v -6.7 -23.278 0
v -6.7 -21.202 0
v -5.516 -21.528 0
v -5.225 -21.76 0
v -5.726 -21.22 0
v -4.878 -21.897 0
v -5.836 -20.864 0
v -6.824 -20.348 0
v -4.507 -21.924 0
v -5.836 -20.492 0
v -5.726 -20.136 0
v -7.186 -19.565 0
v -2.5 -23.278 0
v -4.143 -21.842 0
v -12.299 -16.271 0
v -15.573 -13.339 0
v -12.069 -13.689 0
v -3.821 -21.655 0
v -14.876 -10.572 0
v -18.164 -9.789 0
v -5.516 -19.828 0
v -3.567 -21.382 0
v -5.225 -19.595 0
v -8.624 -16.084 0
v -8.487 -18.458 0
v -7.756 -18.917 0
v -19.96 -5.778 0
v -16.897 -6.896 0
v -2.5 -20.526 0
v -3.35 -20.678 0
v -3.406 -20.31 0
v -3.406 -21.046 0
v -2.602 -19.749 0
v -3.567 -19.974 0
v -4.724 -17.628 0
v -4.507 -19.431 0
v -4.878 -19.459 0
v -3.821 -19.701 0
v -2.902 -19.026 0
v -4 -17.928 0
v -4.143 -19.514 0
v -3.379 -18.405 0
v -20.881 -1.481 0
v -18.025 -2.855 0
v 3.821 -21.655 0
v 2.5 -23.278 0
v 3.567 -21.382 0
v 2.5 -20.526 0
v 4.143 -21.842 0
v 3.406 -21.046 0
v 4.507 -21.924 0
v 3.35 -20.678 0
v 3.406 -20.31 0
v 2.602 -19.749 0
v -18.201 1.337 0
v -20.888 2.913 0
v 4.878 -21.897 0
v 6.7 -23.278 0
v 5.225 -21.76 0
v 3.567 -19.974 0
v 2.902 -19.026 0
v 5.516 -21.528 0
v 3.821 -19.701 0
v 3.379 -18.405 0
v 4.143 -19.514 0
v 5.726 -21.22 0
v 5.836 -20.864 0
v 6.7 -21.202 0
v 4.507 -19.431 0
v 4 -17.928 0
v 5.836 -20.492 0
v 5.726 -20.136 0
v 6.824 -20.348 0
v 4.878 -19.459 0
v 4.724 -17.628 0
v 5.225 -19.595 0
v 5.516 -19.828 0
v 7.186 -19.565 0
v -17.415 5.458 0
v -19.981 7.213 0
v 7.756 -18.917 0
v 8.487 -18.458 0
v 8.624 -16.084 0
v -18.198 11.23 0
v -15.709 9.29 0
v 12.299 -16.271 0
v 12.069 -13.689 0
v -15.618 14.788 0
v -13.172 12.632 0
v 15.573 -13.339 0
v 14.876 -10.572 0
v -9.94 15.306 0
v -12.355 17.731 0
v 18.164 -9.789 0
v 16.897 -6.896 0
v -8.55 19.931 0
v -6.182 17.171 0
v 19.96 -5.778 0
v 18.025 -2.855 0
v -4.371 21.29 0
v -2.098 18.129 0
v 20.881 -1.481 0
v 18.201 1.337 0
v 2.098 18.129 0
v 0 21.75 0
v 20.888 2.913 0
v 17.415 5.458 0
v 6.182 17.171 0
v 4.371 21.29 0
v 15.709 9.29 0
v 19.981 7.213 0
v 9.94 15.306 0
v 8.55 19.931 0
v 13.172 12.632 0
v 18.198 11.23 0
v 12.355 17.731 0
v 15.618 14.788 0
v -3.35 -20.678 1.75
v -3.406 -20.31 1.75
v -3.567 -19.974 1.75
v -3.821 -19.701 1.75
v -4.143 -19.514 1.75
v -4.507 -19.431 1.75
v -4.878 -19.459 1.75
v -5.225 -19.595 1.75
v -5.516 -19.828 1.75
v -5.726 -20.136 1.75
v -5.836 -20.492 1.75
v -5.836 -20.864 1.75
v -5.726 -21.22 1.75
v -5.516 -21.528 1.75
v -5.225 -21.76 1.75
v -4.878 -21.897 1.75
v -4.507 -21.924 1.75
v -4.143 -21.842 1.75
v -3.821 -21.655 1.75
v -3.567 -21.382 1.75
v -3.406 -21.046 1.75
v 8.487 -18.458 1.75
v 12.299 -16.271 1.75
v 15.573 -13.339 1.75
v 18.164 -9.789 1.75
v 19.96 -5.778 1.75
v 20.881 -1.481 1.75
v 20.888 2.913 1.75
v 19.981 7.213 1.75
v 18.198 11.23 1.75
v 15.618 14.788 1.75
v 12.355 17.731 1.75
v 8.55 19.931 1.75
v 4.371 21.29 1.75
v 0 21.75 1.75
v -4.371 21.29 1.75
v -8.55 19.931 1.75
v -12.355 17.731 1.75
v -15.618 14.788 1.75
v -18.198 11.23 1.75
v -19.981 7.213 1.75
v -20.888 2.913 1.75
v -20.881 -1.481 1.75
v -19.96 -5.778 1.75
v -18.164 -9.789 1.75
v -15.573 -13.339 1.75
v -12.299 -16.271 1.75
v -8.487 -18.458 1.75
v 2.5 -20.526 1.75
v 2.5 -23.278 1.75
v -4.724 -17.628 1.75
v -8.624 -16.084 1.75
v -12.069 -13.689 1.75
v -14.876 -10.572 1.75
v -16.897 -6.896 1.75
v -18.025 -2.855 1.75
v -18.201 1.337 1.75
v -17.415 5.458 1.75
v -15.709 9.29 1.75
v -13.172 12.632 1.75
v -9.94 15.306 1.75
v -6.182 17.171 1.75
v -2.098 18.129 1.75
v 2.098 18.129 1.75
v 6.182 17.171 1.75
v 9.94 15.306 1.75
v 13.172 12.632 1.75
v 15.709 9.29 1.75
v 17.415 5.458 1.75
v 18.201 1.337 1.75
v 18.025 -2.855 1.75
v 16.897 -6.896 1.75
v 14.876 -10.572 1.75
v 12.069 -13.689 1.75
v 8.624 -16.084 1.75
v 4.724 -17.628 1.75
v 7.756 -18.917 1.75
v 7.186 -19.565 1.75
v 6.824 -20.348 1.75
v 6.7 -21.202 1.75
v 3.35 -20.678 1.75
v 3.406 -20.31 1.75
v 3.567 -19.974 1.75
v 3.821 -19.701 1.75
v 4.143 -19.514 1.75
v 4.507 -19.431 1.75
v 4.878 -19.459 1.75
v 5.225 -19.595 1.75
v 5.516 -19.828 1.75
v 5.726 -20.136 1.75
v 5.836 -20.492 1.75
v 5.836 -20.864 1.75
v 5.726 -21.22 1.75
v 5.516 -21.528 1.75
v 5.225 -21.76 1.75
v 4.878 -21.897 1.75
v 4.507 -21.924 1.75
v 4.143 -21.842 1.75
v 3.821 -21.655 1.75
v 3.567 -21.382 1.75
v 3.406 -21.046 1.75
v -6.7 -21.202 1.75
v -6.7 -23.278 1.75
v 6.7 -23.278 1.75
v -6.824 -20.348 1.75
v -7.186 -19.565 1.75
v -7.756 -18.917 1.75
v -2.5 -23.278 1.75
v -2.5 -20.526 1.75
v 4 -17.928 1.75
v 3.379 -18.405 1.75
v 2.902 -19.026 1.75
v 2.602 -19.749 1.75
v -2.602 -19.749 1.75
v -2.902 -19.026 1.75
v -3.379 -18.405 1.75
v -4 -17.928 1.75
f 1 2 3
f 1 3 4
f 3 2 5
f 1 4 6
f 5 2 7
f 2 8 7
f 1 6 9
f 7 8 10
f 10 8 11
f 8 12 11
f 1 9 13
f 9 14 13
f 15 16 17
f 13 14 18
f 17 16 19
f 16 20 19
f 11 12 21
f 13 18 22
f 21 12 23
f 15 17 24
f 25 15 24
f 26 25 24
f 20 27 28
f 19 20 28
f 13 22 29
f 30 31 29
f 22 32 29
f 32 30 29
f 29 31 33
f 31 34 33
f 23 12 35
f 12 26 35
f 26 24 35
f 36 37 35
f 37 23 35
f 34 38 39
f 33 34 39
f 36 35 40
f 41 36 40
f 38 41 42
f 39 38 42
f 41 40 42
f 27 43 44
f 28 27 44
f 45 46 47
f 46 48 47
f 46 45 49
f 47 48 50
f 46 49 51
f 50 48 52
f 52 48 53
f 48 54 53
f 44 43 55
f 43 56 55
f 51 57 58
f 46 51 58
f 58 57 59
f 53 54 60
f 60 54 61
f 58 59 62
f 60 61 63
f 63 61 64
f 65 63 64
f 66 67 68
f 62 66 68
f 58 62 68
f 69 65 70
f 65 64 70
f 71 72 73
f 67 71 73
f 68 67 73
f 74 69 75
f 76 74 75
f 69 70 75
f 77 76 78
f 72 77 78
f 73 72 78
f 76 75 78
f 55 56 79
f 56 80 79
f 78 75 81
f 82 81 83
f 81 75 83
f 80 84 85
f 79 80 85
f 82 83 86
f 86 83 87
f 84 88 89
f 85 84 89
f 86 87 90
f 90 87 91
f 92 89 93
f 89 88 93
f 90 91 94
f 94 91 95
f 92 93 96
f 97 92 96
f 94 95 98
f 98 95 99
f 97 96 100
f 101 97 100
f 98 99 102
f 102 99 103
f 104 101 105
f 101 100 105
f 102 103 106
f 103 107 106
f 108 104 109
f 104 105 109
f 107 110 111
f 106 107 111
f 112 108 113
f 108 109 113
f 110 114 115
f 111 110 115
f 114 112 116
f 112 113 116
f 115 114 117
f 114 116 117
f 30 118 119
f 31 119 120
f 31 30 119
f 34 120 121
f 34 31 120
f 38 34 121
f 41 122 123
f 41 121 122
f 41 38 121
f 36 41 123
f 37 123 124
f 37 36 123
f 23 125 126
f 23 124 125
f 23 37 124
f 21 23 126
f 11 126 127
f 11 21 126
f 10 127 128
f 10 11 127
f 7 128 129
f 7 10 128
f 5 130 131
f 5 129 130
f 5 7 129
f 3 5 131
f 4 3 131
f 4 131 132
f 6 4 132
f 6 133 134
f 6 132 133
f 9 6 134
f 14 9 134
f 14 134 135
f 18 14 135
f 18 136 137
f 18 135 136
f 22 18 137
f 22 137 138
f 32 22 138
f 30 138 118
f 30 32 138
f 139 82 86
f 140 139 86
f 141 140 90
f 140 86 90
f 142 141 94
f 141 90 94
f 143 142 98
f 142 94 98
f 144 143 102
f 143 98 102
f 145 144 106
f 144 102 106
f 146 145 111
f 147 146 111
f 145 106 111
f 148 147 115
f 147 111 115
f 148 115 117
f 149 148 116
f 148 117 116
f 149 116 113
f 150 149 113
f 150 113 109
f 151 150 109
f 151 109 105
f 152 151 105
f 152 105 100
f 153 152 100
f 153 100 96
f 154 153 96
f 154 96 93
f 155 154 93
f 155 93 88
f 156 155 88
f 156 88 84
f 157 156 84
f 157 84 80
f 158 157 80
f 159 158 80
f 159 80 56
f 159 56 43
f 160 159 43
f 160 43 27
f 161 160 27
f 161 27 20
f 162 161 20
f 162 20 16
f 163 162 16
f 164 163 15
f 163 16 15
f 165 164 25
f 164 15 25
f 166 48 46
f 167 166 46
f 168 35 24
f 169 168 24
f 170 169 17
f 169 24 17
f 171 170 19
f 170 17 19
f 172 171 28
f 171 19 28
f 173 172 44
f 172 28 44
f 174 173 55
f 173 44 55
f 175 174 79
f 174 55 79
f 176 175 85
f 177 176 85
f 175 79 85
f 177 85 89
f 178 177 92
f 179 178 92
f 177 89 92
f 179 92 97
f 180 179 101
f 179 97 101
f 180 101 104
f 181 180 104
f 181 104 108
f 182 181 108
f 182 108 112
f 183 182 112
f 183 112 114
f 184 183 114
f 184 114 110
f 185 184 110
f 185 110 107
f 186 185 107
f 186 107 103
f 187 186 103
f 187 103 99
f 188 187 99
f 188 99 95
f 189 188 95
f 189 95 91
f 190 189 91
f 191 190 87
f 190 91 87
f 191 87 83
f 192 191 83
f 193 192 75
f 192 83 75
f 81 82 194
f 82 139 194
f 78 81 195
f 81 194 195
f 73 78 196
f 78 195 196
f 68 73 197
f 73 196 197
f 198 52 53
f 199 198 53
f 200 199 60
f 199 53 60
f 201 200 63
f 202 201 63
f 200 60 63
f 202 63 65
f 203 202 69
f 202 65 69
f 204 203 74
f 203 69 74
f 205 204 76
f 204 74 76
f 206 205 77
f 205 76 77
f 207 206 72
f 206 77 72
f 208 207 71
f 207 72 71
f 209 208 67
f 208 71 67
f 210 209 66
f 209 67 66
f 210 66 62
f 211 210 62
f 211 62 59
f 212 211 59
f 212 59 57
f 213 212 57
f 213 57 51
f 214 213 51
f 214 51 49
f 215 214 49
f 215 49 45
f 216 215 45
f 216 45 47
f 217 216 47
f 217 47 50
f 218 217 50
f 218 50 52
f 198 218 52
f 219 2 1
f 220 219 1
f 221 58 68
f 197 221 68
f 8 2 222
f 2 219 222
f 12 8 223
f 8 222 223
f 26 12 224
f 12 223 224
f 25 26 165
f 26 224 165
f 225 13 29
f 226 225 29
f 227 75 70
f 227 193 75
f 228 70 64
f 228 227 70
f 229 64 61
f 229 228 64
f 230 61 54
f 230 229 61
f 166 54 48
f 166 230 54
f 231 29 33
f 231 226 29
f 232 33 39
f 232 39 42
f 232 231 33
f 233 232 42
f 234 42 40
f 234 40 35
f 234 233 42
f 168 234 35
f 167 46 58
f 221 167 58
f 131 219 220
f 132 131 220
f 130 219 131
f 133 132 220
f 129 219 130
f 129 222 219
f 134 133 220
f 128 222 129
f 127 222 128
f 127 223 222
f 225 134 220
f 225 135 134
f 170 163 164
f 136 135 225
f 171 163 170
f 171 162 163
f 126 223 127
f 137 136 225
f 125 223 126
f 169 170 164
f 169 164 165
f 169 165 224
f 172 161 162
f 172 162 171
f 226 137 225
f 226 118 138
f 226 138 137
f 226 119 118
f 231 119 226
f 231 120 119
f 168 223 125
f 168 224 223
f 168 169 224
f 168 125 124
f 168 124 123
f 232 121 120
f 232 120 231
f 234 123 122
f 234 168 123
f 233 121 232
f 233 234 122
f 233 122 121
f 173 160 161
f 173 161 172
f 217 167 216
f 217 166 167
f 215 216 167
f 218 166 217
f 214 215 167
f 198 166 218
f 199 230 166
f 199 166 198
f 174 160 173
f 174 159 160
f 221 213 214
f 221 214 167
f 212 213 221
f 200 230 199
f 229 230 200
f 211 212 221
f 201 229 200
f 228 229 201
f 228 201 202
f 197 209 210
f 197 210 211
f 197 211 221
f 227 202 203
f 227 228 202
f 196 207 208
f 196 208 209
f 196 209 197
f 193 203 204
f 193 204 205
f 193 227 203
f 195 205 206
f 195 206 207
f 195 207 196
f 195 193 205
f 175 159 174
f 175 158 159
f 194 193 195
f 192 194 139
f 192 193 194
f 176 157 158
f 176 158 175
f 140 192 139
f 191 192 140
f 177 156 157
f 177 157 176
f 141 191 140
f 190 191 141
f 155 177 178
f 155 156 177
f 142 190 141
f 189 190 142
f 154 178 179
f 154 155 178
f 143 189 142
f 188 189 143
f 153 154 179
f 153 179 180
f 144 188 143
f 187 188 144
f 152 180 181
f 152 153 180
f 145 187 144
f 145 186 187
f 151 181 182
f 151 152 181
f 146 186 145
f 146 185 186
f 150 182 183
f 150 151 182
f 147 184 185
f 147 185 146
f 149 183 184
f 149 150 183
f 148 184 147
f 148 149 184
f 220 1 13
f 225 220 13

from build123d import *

# Parameters (mm, degrees)
BOSS_EXTRUDE1_DEPTH = 1.75
SKETCH2_R           = 1.25
CUT_EXTRUDE1_DEPTH  = 32.399454524
FILLET1_R           = 3
FILLET2_R           = 3


with BuildPart() as part:
    # Sketch1 → Boss-Extrude1 (new body)
    with BuildSketch(Plane.XY):
        with BuildLine():
            Line((-6.7, -19.152512404), (-6.7, -23.27795619))
            Line((-6.7, -23.27795619), (-2.5, -23.27795619))
            Line((-2.5, -23.27795619), (-2.5, -18.07795619))
            ThreePointArc((-2.5, -18.07795619), (0, 18.25), (2.5, -18.07795619))
            Line((2.5, -18.07795619), (2.5, -23.27795619))
            Line((2.5, -23.27795619), (6.7, -23.27795619))
            Line((6.7, -23.27795619), (6.7, -19.152512404))
            ThreePointArc((6.7, -19.152512404), (0, 21.75), (-6.7, -19.152512404))
        make_face()
    extrude(amount=BOSS_EXTRUDE1_DEPTH)

    # Sketch2 → Cut-Extrude1 (cut, through all)
    with BuildSketch(Plane(origin=(0, 0, 0), x_dir=(-1, 0, 0), z_dir=(0, 0, -1))):
        with Locations((-4.6, -20.67795619)):
            Circle(SKETCH2_R)
    cut_extrude1 = extrude(amount=-CUT_EXTRUDE1_DEPTH, mode=Mode.SUBTRACT)

    # Fillet1
    fillet1_edges = [part.edges().sort_by_distance(p)[0] for p in [
        (6.7, -19.152512404, 0.875),
        (-6.7, -19.152512404, 0.875),
    ]]
    fillet(fillet1_edges, radius=FILLET1_R)

    # Fillet2
    fillet2_edges = [part.edges().sort_by_distance(p)[0] for p in [
        (2.5, -18.07795619, 0.875),
        (-2.5, -18.07795619, 0.875),
    ]]
    fillet(fillet2_edges, radius=FILLET2_R)

    # Mirror1: Cut-Extrude1 across plane
    add(cut_extrude1.mirror(Plane(origin=(0, 0, 0), x_dir=(0, 0, 1), z_dir=(1, 0, 0))), mode=Mode.SUBTRACT)


solid = part.part
